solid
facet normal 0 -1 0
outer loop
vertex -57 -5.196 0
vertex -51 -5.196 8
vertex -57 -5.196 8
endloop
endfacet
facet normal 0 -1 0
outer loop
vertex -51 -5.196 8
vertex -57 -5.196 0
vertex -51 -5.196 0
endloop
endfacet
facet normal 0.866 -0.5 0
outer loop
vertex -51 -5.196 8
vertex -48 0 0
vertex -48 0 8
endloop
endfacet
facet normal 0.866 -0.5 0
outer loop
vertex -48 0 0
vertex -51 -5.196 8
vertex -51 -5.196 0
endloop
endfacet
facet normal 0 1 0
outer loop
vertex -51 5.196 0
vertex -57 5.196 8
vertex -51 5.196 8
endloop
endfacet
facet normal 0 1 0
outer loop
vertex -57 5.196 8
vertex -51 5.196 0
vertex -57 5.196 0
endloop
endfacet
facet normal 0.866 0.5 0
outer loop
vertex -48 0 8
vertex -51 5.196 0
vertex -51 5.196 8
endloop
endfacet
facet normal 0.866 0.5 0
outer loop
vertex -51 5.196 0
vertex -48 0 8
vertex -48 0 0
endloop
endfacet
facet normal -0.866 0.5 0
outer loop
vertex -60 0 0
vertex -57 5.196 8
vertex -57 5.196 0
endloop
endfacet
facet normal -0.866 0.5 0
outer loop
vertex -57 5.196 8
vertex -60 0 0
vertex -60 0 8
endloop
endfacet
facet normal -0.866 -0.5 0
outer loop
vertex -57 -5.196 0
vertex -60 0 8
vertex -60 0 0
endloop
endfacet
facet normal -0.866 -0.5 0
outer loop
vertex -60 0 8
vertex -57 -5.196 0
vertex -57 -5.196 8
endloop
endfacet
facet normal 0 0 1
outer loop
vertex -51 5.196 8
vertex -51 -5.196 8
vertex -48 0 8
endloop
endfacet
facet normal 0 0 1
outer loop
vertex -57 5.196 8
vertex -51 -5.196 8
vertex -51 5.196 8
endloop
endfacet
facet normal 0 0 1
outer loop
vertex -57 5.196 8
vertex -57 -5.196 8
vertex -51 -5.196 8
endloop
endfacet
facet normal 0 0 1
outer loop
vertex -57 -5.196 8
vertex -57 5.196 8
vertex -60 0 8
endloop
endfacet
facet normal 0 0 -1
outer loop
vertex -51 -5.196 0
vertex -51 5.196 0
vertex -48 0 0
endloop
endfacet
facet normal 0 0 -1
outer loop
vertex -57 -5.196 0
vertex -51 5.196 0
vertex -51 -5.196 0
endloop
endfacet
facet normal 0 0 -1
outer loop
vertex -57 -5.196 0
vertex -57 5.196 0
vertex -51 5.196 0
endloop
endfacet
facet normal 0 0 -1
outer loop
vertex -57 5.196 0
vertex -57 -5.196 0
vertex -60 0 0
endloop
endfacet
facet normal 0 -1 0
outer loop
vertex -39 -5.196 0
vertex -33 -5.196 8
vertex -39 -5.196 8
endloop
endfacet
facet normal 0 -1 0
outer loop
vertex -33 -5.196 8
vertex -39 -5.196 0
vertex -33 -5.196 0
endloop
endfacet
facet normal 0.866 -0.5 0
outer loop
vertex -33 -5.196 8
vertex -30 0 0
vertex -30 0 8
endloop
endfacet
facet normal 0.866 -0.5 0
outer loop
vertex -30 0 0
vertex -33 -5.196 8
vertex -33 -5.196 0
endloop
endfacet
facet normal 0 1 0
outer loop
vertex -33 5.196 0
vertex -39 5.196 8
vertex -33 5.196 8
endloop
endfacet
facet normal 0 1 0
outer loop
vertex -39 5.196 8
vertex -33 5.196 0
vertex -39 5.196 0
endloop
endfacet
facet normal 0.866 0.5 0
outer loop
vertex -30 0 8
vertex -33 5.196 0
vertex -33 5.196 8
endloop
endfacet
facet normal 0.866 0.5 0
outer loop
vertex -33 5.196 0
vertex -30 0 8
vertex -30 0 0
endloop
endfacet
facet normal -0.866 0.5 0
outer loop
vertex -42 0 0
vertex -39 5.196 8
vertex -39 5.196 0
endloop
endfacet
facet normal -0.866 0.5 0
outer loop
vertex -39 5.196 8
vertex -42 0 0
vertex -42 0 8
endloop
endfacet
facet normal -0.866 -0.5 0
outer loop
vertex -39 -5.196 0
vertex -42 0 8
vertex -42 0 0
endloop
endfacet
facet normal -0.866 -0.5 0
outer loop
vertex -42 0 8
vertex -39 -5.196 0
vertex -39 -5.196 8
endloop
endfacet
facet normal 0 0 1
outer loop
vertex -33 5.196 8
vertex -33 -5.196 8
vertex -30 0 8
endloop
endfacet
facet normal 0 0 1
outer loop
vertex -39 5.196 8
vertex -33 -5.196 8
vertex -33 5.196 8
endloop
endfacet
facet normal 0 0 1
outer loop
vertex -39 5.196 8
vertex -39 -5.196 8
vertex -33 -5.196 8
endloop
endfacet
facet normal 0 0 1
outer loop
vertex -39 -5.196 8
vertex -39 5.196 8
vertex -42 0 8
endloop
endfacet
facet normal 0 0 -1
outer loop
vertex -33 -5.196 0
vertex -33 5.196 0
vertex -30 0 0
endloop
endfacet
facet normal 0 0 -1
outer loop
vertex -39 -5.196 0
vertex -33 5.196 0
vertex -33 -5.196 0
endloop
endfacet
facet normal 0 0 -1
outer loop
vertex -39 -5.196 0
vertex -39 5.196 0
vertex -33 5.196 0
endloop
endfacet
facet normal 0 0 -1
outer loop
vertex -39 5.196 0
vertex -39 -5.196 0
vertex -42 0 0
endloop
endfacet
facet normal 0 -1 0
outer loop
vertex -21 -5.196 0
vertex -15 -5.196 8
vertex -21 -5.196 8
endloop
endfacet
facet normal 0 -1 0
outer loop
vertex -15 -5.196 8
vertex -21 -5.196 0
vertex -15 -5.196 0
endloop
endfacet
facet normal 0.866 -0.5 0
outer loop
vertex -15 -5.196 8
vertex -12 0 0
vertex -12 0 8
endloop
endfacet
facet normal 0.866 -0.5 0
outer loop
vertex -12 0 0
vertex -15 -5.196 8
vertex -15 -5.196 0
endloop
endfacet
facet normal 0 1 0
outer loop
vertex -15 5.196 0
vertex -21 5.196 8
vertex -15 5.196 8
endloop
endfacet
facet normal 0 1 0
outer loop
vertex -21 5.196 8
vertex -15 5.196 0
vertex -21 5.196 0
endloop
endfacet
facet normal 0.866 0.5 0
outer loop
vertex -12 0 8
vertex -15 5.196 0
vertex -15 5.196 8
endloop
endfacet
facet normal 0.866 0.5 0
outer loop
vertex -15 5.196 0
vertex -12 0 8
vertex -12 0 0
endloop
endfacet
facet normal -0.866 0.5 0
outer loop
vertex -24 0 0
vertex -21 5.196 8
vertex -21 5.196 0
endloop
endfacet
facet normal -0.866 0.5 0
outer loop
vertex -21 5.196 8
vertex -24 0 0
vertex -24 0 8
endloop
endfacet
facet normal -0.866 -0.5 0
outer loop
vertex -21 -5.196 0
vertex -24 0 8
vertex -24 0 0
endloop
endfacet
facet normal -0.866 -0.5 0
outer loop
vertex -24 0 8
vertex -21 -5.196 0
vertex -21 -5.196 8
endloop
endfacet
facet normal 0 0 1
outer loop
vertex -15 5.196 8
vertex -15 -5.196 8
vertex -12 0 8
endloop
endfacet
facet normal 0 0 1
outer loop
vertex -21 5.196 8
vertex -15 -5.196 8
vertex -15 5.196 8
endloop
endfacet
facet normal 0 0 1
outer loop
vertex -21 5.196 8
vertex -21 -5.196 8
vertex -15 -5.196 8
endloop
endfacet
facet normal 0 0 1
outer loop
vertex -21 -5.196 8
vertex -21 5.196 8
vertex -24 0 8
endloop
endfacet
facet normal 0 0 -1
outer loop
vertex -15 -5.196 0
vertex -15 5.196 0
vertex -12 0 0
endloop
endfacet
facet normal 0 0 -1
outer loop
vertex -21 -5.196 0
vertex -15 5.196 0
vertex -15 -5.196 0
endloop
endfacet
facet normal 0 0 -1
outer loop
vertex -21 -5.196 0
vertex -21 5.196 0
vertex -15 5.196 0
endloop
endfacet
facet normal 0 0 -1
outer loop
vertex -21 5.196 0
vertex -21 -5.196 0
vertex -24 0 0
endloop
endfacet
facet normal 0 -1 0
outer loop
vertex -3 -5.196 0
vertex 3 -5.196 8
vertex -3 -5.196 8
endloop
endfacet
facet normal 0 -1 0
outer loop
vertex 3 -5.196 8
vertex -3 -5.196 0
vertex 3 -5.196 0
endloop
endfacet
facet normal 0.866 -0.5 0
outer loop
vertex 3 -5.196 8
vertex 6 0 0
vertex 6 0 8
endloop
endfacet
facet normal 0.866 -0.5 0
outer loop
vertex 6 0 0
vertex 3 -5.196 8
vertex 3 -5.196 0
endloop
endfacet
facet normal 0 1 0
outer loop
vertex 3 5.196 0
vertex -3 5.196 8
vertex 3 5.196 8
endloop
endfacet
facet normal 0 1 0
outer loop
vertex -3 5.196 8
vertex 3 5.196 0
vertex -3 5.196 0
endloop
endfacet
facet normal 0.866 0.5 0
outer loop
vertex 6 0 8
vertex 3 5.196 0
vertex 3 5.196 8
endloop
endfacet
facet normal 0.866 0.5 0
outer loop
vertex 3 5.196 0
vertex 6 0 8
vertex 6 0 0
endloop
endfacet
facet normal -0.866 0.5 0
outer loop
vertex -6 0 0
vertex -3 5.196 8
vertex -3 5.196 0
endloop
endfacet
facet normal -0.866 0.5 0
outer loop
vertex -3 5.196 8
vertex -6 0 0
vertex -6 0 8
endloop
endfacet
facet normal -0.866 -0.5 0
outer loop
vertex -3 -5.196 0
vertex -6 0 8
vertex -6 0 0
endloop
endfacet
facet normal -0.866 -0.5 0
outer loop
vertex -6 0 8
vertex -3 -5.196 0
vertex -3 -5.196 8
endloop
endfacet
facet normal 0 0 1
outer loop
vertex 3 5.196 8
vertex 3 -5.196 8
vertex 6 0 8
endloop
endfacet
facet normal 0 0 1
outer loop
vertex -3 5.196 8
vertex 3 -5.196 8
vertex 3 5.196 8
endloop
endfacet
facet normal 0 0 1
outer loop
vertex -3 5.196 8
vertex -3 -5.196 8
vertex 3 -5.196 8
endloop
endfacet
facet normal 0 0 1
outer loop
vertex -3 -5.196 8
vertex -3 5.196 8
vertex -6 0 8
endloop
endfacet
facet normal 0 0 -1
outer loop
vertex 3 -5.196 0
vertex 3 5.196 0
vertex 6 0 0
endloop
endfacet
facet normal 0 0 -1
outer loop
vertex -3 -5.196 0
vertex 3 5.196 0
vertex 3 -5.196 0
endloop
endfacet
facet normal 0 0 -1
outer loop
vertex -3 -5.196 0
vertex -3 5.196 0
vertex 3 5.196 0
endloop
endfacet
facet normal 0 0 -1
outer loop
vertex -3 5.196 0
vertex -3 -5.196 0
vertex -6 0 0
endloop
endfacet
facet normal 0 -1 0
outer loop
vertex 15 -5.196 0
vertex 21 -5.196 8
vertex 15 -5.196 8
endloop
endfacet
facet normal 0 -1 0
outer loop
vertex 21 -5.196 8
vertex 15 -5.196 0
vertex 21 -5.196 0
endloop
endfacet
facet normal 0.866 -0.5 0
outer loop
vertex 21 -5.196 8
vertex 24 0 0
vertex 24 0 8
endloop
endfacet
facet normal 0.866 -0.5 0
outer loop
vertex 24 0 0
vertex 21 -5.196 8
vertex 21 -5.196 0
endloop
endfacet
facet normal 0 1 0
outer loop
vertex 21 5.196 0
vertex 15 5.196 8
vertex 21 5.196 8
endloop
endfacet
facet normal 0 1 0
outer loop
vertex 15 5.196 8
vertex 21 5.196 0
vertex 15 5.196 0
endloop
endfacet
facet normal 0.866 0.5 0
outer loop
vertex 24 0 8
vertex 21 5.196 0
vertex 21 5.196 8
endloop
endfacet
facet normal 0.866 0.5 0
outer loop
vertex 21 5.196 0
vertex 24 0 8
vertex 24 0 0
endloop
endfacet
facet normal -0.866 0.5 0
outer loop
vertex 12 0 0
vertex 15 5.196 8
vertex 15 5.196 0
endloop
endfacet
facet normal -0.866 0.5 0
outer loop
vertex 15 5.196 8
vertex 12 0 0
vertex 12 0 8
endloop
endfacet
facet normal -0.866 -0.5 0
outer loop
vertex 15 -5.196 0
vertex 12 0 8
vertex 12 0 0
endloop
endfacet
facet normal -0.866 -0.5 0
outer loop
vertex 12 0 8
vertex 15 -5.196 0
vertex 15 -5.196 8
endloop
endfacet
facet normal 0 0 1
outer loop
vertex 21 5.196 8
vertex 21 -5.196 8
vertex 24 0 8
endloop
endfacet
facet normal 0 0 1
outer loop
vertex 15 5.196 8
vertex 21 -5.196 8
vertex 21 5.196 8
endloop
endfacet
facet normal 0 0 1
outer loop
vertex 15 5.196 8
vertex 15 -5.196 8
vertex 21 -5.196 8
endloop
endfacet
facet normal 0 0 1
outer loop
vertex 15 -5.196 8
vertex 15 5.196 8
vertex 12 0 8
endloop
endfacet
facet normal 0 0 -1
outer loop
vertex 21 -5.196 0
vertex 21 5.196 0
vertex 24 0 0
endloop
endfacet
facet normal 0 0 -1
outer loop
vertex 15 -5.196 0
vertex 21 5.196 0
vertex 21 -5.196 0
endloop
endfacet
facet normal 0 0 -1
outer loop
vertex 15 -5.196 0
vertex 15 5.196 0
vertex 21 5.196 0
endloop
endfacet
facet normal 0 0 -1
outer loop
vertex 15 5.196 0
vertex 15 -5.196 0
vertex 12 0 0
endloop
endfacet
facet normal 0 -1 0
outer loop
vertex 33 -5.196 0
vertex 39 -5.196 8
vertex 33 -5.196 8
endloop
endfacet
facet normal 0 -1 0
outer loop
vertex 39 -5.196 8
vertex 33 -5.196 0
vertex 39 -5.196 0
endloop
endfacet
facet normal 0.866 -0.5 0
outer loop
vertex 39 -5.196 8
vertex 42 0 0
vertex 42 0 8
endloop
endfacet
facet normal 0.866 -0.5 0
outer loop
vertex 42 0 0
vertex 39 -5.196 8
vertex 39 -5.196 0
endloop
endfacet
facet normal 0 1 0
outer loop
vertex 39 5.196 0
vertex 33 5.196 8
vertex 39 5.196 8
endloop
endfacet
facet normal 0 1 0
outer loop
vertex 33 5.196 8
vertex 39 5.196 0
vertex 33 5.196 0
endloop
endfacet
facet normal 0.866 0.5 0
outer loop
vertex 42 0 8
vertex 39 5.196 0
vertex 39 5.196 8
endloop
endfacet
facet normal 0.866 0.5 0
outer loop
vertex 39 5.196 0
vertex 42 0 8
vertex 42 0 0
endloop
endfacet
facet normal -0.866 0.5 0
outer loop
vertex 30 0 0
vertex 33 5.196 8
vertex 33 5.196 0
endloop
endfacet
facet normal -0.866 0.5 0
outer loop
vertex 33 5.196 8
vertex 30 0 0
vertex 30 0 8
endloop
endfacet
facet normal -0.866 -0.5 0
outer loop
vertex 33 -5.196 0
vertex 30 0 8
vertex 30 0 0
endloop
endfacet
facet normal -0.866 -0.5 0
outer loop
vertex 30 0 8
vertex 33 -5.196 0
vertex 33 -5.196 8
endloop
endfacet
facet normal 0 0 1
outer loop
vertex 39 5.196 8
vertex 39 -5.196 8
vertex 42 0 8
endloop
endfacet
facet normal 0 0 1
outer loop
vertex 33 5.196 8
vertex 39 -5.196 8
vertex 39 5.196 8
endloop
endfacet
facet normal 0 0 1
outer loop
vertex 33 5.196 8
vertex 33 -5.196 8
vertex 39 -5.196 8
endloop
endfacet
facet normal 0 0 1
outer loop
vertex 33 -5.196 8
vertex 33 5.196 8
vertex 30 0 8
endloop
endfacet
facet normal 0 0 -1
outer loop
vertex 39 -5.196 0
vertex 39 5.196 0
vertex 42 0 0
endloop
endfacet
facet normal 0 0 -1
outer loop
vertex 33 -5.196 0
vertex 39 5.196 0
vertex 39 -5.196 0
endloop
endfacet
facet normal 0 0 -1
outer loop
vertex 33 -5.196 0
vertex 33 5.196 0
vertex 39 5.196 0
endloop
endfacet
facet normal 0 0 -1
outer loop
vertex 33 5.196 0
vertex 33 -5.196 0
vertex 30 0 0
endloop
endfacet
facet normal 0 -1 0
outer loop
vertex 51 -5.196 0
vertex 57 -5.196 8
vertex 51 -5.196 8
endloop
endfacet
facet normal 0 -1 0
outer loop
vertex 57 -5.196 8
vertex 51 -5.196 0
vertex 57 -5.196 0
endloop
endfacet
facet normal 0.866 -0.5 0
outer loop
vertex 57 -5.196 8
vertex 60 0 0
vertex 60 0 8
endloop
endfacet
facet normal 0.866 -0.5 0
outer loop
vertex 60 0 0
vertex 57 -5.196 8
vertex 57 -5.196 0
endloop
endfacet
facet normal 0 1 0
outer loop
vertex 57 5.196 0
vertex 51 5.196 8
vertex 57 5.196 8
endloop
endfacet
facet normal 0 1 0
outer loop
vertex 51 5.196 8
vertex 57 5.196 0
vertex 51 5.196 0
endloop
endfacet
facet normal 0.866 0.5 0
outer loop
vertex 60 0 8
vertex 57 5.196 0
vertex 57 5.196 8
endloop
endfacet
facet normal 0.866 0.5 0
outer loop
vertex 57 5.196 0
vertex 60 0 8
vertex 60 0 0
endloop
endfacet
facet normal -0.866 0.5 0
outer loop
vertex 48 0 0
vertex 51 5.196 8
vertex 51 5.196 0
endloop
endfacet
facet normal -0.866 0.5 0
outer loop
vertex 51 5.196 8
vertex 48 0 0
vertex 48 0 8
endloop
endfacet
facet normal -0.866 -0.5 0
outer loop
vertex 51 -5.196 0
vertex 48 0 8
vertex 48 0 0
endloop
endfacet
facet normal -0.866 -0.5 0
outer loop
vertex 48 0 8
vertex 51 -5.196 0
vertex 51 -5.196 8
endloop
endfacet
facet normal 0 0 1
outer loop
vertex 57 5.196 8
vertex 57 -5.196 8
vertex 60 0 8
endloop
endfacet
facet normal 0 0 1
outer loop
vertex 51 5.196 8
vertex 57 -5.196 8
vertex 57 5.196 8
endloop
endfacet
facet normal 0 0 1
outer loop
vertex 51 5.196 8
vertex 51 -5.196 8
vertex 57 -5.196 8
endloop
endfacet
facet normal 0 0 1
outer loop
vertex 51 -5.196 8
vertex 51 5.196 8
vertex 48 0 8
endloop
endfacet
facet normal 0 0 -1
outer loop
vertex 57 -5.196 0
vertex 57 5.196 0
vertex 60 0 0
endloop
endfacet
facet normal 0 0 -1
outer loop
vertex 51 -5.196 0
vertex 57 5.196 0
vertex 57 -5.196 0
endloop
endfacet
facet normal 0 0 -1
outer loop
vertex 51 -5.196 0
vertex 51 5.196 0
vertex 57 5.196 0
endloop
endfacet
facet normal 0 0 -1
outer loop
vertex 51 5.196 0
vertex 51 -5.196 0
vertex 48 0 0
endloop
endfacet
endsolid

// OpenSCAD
// Seven loose feet for the quartered HexTrack tile: six vertex feet plus one center foot.

feet_count = 7;
feet_height = 8;
feet_diameter = 12;
foot_spacing = 18;

for (i = [0 : feet_count - 1]) {
    translate([(i - (feet_count - 1) / 2) * foot_spacing, 0, 0])
        cylinder(d = feet_diameter, h = feet_height, $fn = 6);
}
